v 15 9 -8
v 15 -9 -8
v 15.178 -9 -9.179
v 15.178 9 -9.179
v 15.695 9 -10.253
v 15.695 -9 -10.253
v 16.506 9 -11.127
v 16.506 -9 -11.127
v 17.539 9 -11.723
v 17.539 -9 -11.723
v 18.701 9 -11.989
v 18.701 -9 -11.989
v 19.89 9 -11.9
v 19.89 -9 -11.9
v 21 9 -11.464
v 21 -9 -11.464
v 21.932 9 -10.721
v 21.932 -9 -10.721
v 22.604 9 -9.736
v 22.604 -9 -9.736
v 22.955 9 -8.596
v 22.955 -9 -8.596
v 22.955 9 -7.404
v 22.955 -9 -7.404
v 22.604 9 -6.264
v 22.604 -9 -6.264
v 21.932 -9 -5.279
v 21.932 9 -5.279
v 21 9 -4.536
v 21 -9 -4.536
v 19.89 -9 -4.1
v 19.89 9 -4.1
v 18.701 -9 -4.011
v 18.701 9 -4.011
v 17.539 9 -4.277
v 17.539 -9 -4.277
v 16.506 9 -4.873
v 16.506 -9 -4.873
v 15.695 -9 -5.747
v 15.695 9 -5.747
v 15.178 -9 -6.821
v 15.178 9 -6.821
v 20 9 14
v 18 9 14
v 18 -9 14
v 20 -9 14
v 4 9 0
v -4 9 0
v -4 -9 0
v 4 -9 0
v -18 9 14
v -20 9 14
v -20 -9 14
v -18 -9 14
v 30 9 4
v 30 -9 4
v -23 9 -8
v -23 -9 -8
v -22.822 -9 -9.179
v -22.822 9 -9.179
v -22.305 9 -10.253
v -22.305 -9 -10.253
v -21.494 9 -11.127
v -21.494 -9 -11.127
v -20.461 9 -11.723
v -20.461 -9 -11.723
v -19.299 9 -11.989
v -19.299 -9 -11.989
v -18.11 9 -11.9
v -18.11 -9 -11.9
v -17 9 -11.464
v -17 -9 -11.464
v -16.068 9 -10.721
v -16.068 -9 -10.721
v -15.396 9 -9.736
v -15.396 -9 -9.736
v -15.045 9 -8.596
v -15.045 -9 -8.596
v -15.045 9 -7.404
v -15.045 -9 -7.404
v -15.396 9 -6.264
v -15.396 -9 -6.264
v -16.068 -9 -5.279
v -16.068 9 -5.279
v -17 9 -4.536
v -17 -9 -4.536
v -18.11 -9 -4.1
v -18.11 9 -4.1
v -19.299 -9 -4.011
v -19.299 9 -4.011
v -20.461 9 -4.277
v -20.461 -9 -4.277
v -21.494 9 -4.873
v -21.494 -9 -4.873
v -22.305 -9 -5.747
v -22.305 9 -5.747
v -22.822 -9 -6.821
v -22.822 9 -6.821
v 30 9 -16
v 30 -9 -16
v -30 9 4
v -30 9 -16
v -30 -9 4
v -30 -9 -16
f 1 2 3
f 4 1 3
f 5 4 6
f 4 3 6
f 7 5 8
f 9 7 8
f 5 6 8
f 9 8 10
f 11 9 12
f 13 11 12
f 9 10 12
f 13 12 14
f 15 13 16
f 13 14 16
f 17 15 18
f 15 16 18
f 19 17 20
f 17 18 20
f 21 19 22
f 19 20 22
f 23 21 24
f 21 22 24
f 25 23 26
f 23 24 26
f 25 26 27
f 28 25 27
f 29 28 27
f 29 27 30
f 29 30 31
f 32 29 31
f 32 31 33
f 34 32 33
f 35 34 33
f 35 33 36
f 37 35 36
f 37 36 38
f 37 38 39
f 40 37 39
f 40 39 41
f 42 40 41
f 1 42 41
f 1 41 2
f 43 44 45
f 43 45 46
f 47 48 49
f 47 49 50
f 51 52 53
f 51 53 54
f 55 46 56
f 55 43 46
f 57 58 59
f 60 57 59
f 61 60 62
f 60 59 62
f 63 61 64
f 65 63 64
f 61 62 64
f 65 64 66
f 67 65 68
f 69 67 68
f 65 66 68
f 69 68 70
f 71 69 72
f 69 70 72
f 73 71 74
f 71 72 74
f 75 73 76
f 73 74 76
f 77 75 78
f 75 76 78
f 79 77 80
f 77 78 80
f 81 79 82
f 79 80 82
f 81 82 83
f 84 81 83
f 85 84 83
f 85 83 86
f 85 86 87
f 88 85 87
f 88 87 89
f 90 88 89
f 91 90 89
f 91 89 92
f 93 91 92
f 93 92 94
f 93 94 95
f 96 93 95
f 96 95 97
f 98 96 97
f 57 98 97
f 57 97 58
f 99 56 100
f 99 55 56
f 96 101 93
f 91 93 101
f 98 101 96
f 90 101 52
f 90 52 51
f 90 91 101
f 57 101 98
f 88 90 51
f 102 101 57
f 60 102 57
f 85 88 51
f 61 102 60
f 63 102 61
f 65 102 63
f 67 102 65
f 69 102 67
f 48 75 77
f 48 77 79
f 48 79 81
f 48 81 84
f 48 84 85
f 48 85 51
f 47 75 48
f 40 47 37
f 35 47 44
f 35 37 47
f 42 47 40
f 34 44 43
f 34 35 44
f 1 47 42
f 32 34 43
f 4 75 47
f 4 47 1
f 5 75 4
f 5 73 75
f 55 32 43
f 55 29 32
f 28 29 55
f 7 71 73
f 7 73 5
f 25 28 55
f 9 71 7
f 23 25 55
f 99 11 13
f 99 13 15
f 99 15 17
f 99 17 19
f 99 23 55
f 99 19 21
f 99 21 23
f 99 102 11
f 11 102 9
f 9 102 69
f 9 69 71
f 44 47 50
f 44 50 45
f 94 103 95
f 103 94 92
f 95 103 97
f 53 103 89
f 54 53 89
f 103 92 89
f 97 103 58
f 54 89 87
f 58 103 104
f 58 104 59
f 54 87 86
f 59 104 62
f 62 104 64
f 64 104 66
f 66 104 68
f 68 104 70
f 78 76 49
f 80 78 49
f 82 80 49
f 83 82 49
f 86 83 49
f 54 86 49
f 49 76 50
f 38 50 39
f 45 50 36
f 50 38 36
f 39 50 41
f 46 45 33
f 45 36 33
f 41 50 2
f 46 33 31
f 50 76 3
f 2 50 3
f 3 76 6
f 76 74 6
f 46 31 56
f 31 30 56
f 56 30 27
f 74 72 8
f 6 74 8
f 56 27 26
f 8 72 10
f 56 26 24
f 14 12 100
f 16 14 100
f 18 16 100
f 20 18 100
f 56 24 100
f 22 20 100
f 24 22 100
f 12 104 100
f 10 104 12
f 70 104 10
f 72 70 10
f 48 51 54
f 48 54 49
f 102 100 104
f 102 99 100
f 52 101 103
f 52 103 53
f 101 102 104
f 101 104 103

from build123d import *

# Parameters (mm, degrees)
ESTRUSIONE_ESTRUSIONE1_DEPTH = 9
FORO_8_0_8_1_D               = 8


with BuildPart() as part:
    # Schizzo1 → Estrusione-Estrusione1 (new, symmetric)
    with BuildSketch(Plane(origin=(0, 0, 0), x_dir=(1, 0, 0), z_dir=(0, 1, 0))):
        Polygon((30, 16), (-30, 16), (-30, -4), (-20, -14), (-18, -14), (-4, 0), (4, 0), (18, -14), (20, -14), (30, -4), align=None)
    extrude(amount=ESTRUSIONE_ESTRUSIONE1_DEPTH, both=True)

    # Foro Ø8.0 (8)-1 (through all)
    with Locations(Plane(origin=(0, 9, 0), x_dir=(1, 0, 0), z_dir=(0, 1, 0))):
        with Locations((19, 8), (-19, 8)):
            Hole(FORO_8_0_8_1_D / 2)


solid = part.part
